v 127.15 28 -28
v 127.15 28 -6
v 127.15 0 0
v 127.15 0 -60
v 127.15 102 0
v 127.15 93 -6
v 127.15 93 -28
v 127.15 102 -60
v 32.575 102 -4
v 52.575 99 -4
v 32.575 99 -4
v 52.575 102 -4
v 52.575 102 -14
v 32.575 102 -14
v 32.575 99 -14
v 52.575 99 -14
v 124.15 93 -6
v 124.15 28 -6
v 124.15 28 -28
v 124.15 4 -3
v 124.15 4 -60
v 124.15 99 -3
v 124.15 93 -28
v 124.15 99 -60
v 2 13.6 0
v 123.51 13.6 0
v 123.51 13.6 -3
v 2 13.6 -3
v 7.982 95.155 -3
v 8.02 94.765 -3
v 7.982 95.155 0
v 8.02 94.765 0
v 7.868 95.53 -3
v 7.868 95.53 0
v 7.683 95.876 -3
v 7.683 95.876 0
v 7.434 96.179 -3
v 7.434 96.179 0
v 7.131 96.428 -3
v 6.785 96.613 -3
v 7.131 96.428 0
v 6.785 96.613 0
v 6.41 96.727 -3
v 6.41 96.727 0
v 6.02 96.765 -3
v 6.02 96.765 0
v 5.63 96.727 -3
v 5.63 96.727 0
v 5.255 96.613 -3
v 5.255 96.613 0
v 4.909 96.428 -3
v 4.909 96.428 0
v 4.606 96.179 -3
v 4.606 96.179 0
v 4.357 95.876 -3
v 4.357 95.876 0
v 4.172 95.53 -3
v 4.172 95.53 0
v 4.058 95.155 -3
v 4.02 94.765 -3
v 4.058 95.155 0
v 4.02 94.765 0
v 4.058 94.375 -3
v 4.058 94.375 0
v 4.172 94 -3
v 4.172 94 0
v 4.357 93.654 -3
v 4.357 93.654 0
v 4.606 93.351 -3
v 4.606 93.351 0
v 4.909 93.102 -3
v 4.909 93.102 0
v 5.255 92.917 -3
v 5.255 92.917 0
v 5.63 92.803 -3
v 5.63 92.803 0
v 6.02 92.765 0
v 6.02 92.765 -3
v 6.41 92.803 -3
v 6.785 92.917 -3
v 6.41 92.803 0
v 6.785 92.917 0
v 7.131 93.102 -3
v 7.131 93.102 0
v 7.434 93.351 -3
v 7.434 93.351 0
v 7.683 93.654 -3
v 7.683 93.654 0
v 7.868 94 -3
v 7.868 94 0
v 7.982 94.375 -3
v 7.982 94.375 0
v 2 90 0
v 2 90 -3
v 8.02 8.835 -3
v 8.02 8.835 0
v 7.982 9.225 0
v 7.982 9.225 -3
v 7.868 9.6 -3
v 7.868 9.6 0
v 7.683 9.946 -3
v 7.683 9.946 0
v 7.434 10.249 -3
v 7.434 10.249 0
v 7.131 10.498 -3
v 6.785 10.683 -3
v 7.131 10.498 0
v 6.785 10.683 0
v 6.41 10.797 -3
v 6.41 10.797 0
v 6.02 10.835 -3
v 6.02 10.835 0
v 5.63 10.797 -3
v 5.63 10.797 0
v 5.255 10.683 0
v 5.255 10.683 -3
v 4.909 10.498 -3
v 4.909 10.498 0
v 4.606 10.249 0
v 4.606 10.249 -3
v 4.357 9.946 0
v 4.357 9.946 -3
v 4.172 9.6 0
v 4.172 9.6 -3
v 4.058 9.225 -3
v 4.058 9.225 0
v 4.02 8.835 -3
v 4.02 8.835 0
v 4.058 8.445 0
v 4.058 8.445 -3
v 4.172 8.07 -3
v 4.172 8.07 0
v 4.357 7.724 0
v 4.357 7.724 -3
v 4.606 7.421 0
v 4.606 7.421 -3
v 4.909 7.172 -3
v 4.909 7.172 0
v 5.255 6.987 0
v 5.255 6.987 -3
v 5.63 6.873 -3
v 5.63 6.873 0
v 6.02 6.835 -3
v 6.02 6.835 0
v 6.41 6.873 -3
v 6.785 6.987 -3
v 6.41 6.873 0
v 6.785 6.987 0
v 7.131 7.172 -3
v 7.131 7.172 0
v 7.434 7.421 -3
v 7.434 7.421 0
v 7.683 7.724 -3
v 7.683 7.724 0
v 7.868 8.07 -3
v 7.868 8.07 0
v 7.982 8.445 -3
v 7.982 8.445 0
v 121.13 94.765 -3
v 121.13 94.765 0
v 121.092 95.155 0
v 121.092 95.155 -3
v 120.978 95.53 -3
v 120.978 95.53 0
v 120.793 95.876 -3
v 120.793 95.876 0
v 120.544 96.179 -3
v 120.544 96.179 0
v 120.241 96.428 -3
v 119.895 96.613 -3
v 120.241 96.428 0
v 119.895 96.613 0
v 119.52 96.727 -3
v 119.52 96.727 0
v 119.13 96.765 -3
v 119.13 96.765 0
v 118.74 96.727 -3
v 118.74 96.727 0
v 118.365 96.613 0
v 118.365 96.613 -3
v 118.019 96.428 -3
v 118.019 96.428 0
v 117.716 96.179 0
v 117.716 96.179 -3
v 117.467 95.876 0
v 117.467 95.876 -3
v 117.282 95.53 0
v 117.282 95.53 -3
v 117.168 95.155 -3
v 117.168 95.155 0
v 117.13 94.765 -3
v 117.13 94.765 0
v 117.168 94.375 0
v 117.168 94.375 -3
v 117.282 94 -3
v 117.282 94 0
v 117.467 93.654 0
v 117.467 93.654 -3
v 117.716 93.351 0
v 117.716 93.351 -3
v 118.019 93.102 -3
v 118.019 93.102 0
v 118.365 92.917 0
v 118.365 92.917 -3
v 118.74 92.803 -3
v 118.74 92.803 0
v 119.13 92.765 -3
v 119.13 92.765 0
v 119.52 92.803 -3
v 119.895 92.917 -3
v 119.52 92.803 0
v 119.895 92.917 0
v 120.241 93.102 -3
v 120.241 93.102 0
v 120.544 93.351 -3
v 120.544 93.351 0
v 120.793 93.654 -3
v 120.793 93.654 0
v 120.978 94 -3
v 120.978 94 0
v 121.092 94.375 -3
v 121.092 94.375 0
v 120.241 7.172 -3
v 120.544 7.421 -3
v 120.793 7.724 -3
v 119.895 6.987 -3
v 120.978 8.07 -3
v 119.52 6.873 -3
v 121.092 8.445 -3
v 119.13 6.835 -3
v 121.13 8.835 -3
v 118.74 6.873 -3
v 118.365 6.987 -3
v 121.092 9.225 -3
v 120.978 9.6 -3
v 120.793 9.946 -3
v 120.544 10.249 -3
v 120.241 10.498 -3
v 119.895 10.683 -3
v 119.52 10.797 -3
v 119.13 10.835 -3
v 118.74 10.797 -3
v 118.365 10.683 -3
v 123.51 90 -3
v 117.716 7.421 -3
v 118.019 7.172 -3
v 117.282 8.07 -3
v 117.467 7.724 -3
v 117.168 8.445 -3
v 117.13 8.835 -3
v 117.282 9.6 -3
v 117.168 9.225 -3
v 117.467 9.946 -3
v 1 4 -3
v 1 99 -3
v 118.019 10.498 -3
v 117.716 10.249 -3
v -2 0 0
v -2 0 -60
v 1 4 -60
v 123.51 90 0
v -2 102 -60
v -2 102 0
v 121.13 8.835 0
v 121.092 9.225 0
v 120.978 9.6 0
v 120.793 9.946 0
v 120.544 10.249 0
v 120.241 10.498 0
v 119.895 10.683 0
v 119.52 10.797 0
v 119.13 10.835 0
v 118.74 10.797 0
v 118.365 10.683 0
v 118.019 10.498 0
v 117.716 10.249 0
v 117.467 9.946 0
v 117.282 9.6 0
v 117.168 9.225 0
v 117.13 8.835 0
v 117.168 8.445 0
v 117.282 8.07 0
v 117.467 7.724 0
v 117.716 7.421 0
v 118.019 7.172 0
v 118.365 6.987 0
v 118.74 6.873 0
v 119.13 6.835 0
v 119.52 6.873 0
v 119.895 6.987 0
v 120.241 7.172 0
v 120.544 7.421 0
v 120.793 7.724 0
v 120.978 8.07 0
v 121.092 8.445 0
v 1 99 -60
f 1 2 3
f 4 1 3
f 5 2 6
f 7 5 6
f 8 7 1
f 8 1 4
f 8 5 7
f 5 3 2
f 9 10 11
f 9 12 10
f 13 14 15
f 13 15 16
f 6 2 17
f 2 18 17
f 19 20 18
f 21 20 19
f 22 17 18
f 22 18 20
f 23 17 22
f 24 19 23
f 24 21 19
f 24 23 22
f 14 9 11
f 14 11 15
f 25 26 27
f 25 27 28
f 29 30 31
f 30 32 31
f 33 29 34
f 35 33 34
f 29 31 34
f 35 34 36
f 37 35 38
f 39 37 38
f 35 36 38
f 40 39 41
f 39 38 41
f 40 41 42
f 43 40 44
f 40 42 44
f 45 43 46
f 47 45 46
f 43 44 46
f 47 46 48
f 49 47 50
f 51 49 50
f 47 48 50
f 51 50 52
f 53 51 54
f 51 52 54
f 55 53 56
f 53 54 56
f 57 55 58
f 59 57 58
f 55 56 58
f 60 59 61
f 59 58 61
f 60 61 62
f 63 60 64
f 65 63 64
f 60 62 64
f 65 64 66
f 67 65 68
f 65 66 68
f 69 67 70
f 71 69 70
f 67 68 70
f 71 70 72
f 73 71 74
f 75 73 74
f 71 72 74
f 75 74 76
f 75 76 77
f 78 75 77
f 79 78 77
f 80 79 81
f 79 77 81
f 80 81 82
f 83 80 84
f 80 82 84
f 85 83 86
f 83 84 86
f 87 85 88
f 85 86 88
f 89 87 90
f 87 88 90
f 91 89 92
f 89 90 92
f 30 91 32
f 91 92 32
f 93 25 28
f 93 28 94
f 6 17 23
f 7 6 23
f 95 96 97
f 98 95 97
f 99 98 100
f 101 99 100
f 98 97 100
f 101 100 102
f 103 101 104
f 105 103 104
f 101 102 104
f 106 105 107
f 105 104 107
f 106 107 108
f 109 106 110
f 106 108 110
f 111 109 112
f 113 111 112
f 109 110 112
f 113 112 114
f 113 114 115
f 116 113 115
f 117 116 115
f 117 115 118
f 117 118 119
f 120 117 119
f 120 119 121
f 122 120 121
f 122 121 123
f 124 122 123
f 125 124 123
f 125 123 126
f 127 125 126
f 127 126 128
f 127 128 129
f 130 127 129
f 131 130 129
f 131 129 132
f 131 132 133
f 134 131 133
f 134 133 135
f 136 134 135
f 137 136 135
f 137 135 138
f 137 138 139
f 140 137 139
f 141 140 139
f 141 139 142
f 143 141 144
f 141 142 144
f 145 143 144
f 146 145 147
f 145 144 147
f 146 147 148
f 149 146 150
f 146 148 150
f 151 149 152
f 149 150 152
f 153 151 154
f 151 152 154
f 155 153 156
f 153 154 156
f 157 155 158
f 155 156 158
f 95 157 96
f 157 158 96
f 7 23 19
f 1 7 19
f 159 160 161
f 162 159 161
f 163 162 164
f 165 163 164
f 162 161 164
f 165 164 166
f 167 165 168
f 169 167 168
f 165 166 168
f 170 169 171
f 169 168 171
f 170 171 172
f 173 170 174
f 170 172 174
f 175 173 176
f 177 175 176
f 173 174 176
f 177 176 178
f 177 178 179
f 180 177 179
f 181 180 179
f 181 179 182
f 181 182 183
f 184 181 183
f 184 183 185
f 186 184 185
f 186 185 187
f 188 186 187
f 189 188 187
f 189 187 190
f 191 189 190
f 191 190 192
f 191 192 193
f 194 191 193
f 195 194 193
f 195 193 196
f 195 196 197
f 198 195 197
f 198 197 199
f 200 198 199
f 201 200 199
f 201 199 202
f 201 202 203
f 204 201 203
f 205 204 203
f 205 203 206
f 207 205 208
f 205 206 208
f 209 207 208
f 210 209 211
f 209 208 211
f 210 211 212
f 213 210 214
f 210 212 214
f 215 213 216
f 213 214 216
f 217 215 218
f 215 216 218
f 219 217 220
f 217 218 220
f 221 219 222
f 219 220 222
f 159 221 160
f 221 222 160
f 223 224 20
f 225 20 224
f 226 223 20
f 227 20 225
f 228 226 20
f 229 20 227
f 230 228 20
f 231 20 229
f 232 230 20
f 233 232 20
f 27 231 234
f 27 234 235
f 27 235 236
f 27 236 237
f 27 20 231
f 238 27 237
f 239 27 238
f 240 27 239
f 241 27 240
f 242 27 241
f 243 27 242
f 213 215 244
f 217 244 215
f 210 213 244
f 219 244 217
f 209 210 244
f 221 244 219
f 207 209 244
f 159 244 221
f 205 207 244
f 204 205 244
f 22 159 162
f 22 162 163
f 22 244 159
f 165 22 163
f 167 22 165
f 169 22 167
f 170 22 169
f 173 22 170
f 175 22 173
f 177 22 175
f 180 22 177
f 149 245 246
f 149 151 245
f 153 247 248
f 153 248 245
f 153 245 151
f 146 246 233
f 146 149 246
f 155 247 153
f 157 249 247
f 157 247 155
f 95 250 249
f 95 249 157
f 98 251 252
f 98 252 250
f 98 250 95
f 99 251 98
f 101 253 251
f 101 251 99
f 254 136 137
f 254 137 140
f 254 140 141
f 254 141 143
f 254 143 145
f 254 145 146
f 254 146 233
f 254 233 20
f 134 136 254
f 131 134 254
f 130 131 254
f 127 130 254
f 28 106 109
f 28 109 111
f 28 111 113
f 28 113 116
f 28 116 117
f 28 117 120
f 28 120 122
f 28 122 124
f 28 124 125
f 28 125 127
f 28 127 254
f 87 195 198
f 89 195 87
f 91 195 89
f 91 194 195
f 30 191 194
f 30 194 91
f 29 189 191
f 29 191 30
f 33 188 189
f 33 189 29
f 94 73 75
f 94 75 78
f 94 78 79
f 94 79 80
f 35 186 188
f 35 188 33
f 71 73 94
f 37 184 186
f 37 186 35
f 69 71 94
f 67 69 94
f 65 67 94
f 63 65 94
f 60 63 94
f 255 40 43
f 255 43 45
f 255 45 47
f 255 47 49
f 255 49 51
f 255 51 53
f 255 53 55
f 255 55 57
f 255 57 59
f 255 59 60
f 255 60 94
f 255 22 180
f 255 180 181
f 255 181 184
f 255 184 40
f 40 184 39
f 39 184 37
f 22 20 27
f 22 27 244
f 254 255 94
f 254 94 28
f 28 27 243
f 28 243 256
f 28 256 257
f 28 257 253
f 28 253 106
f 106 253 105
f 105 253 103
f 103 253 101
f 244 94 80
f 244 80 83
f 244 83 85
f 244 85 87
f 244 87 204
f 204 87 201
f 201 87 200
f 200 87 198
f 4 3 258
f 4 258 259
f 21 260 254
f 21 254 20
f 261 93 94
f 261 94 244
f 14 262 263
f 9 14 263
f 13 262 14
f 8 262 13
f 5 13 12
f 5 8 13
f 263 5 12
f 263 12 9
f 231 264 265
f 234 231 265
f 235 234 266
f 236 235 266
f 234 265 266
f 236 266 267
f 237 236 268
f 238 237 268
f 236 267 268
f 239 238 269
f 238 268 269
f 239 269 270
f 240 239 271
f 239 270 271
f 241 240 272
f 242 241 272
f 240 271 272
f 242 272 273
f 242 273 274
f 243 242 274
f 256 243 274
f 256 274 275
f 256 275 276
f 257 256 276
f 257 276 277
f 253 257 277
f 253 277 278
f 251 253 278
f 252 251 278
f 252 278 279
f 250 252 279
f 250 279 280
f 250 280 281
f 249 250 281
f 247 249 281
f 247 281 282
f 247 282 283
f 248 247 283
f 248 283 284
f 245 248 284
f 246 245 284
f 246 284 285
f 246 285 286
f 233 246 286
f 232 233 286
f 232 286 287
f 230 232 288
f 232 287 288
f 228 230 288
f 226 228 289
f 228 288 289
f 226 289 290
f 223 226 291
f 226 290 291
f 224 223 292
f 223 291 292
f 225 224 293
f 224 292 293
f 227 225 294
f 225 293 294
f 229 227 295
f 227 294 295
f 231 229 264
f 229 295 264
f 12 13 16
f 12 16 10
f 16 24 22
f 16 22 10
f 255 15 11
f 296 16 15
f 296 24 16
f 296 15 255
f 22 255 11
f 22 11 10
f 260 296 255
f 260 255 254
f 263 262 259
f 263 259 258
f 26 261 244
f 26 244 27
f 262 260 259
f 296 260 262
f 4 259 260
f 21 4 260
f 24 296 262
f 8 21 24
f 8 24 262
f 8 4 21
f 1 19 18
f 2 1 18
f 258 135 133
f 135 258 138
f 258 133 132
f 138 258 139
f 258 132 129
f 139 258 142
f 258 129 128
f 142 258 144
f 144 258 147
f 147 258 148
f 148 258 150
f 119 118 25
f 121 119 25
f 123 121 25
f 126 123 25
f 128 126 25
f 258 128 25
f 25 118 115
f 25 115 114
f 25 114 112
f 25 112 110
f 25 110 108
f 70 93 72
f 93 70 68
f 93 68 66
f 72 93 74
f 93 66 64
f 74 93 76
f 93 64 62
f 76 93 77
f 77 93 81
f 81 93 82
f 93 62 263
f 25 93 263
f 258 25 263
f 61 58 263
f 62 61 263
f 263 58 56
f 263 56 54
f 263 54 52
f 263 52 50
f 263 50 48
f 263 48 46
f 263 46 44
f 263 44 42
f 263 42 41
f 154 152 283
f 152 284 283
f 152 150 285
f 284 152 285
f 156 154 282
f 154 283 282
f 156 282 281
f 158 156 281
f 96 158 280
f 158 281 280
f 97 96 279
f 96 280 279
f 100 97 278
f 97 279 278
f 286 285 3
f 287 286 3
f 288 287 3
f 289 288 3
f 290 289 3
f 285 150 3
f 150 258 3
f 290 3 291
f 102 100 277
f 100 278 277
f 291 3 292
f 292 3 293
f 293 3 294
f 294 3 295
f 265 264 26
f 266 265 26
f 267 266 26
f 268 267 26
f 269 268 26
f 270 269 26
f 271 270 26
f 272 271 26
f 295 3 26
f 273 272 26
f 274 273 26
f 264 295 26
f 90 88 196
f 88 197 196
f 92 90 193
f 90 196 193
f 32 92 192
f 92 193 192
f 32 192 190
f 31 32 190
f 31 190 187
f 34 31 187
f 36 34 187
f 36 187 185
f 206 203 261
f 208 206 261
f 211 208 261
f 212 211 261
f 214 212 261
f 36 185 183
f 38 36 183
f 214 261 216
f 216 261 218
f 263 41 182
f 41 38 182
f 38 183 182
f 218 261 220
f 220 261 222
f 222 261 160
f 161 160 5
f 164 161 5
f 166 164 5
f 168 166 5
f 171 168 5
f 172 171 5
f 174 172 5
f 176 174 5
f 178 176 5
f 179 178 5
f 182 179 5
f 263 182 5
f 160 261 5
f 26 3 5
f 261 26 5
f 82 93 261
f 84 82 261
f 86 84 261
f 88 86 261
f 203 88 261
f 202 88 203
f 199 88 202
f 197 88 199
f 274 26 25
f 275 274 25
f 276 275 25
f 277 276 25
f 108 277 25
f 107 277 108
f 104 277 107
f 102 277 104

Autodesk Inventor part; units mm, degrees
ref_plane "YZ Plane" through (0, 0, 0) normal (1, 0, 0) x (0, 1, 0)
ref_plane "XZ Plane" through (0, 0, 0) normal (0, 1, 0) x (-1, 0, 0)
ref_plane "XY Plane" through (0, 0, 0) normal (0, 0, 1) x (1, 0, 0)
sketch "Sketch1" plane through (0, 0, 0) normal (0, 1, 0) x (-1, 0, 0)
  line L0 (0, 0) -> (-125.15, 0)
  line L1 (-125.15, 0) -> (-125.15, -60)
  line L2 (-125.15, -60) -> (0, -60)
  line L3 (0, -60) -> (0, 0)
  dimension "d0" = 125.15
  dimension "d1" = 60
extrude "Extrusion1" add sketch "Sketch1" along normal blind 100
sketch "Sketch2" plane through (0, 0, 0) normal (0, 0, 1) x (1, 0, 0)
  line L0 (2, 90) -> (123.51, 90)
  line L1 (123.51, 90) -> (123.51, 13.6)
  line L2 (123.51, 13.6) -> (2, 13.6)
  line L3 (2, 13.6) -> (2, 90)
  line L4 (0, 0) -> (125.15, 0) projected
  line L5 (0, 0) -> (0, 100) projected
  line L6 (0, 100) -> (125.15, 100) projected
  circle A0 centre (6.02, 94.765) radius 2
  circle A1 centre (6.02, 8.835) radius 2
  circle A2 centre (119.13, 94.765) radius 2
  circle A3 centre (119.13, 8.835) radius 2
  dimension "d4" = 76.4
  dimension "d5" = 121.51
  dimension "d7" = 2
  dimension "d15" = 10
  dimension "d16" = 4
  dimension "d17" = 4.765
  dimension "d18" = 4
  dimension "d19" = 85.93
  dimension "d21" = 4
  dimension "d22" = 113.11
  dimension "d23" = 6.02
  dimension "d24" = 4
  dimension "d25" = 4.765
  dimension "d26" = 113.11
extrude "Extrusion2" cut sketch "Sketch2" against normal blind 3
sketch "Sketch5" plane through (125.15, 0, 0) normal (1, 0, 0) x (0, 0, -1)
  line L0 (6, 93) -> (28, 93)
  line L1 (28, 93) -> (28, 28)
  line L2 (28, 28) -> (6, 28)
  line L3 (6, 28) -> (6, 93)
  line L4 (0, 100) -> (60, 100) projected
  line L5 (0, 0) -> (60, 0) projected
  line L6 (0, 0) -> (0, 100) projected
  point P0 (17, 93)
  point P1 (17, 28)
  dimension "d35" = 7
  dimension "d37" = 6
  dimension "d38" = 22
  dimension "d39" = 65
extrude "Extrusion4" cut sketch "Sketch5" against normal blind 10
sketch "Sketch7" plane through (125.15, 0, -60) normal (0, 0, -1) x (-1, 0, 0)
  line L0 (1, 99) -> (124.15, 99)
  line L1 (124.15, 99) -> (124.15, 4)
  line L2 (124.15, 4) -> (1, 4)
  line L3 (1, 4) -> (1, 99)
  line L4 (0, 100) -> (125.15, 100) projected
  line L5 (0, 0) -> (125.15, 0) projected
  line L6 (0, 0) -> (0, 100) projected
  line L7 (125.15, 0) -> (125.15, 100) projected
  dimension "d46" = 1
  dimension "d47" = 4
  dimension "d48" = 1
  dimension "d49" = 1
extrude "Extrusion6" cut sketch "Sketch7" against normal blind 57 contours L0 L1 L2 L3
sketch "Sketch8" plane through (0, 100, 0) normal (0, 1, 0) x (1, 0, 0)
  line L0 (125.15, 0) -> (125.15, 60) projected
  line L1 (125.15, 60) -> (0, 60) projected
  line L2 (125.15, 0) -> (0, 0)
  line L3 (0, 0) -> (0, 60)
  line L4 (0, 60) -> (125.15, 60)
  line L5 (125.15, 60) -> (125.15, 0)
  point P0 (0, 0)
extrude "Extrusion7" add sketch "Sketch8" along normal blind 2
sketch "Sketch9" plane through (125.15, 0, 0) normal (1, 0, 0) x (0, 0, -1)
  line L0 (0, 0) -> (60, 0) projected
  line L1 (0, 102) -> (60, 102)
  line L2 (60, 102) -> (60, 0)
  line L3 (60, 0) -> (0, 0)
  line L4 (0, 0) -> (0, 102)
  line L5 (6, 93) -> (28, 93) projected
  line L6 (28, 93) -> (28, 28) projected
  line L7 (6, 93) -> (28, 93)
  line L8 (28, 93) -> (28, 28)
  line L9 (28, 28) -> (6, 28)
  line L10 (6, 28) -> (6, 93)
extrude "Extrusion8" add sketch "Sketch9" along normal blind 2
sketch "Sketch10" plane through (0, 0, -60) normal (-1, 0, 0) x (0, 0, 1)
  line L0 (0, 0) -> (0, 102) projected
  line L1 (60, 0) -> (60, 102) projected
  line L2 (0, 102) -> (60, 102)
  line L3 (60, 102) -> (60, 0)
  line L4 (60, 0) -> (0, 0)
  line L5 (0, 0) -> (0, 102)
extrude "Extrusion9" add sketch "Sketch10" along normal blind 2
sketch "Sketch11" plane through (0, 102, 0) normal (0, 1, 0) x (1, 0, 0)
  line L0 (-2, 60) -> (127.15, 60) projected
  line L1 (62.575, 60) -> (62.575, 0)
  line L2 (-2, 0) -> (-2, 60) projected
  line L3 (32.575, 14) -> (52.575, 14)
  line L4 (52.575, 14) -> (52.575, 4)
  line L5 (52.575, 4) -> (32.575, 4)
  line L6 (32.575, 4) -> (32.575, 14)
  line L7 (127.15, 0) -> (-2, 0) projected
  point P0 (0, 0)
  dimension "d58" = 64.575
  dimension "d59" = 10
  dimension "d60" = 20
  dimension "d61" = 4
  dimension "d62" = 10
extrude "Extrusion10" cut sketch "Sketch11" against normal blind 3 contours L3 L4 L5 L6
properties part number "Behuizing_3DPrint"
